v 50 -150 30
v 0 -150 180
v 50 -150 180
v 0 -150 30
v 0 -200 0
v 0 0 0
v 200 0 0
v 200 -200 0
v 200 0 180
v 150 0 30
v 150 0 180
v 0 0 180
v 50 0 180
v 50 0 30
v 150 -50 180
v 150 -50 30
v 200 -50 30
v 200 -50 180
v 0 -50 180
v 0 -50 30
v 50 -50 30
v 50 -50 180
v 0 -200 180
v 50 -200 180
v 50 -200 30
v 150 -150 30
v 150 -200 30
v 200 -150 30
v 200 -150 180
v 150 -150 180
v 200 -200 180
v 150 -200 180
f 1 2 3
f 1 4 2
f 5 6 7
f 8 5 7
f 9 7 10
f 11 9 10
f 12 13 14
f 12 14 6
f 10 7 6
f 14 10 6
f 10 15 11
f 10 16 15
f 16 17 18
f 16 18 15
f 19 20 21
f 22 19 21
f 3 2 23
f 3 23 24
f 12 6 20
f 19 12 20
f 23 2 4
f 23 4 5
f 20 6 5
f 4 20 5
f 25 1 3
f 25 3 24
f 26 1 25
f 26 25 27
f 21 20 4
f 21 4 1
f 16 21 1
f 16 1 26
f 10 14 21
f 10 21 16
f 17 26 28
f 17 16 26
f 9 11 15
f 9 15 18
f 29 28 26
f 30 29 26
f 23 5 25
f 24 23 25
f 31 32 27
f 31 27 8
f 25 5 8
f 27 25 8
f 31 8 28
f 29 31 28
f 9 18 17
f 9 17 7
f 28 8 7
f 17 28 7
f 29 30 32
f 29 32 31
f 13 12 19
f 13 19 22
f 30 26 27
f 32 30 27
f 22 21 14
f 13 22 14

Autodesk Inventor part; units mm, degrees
ref_plane "YZ Plane" through (0, 0, 0) normal (1, 0, 0) x (0, 1, 0)
ref_plane "XZ Plane" through (0, 0, 0) normal (0, 1, 0) x (-1, 0, 0)
ref_plane "XY Plane" through (0, 0, 0) normal (0, 0, 1) x (1, 0, 0)
sketch "Sketch1" plane through (0, 0, 0) normal (0, 0, 1) x (1, 0, 0)
  line L0 (0, 0) -> (0, -200)
  line L1 (0, -200) -> (200, -200)
  line L2 (200, -200) -> (200, 0)
  line L3 (200, 0) -> (0, 0)
  dimension "d0" = 200
  dimension "d1" = 200
extrude "Extrusion1" add sketch "Sketch1" along normal blind 30
sketch "Sketch2" plane through (0, 0, 30) normal (0, 0, 1) x (1, 0, 0)
  line L0 (0, 0) -> (0, -200) projected
  line L1 (0, 0) -> (0, -50)
  line L2 (0, -50) -> (50, -50)
  line L3 (50, -50) -> (50, 0)
  line L4 (50, 0) -> (0, 0)
  line L5 (200, -200) -> (200, 0) projected
  line L6 (200, 0) -> (200, -50)
  line L7 (200, -50) -> (150, -50)
  line L8 (150, -50) -> (150, 0)
  line L9 (150, 0) -> (200, 0)
  line L10 (0, -200) -> (0, -150)
  line L11 (0, -150) -> (50, -150)
  line L12 (50, -150) -> (50, -200)
  line L13 (50, -200) -> (0, -200)
  line L14 (200, -200) -> (200, -150)
  line L15 (200, -150) -> (150, -150)
  line L16 (150, -150) -> (150, -200)
  line L17 (150, -200) -> (200, -200)
  dimension "d4" = 50
  dimension "d5" = 50
  dimension "d6" = 50
  dimension "d7" = 50
  dimension "d8" = 50
  dimension "d9" = 50
  dimension "d10" = 50
  dimension "d11" = 50
extrude "Extrusion2" add sketch "Sketch2" along normal blind 150
properties part number "STand_1"
